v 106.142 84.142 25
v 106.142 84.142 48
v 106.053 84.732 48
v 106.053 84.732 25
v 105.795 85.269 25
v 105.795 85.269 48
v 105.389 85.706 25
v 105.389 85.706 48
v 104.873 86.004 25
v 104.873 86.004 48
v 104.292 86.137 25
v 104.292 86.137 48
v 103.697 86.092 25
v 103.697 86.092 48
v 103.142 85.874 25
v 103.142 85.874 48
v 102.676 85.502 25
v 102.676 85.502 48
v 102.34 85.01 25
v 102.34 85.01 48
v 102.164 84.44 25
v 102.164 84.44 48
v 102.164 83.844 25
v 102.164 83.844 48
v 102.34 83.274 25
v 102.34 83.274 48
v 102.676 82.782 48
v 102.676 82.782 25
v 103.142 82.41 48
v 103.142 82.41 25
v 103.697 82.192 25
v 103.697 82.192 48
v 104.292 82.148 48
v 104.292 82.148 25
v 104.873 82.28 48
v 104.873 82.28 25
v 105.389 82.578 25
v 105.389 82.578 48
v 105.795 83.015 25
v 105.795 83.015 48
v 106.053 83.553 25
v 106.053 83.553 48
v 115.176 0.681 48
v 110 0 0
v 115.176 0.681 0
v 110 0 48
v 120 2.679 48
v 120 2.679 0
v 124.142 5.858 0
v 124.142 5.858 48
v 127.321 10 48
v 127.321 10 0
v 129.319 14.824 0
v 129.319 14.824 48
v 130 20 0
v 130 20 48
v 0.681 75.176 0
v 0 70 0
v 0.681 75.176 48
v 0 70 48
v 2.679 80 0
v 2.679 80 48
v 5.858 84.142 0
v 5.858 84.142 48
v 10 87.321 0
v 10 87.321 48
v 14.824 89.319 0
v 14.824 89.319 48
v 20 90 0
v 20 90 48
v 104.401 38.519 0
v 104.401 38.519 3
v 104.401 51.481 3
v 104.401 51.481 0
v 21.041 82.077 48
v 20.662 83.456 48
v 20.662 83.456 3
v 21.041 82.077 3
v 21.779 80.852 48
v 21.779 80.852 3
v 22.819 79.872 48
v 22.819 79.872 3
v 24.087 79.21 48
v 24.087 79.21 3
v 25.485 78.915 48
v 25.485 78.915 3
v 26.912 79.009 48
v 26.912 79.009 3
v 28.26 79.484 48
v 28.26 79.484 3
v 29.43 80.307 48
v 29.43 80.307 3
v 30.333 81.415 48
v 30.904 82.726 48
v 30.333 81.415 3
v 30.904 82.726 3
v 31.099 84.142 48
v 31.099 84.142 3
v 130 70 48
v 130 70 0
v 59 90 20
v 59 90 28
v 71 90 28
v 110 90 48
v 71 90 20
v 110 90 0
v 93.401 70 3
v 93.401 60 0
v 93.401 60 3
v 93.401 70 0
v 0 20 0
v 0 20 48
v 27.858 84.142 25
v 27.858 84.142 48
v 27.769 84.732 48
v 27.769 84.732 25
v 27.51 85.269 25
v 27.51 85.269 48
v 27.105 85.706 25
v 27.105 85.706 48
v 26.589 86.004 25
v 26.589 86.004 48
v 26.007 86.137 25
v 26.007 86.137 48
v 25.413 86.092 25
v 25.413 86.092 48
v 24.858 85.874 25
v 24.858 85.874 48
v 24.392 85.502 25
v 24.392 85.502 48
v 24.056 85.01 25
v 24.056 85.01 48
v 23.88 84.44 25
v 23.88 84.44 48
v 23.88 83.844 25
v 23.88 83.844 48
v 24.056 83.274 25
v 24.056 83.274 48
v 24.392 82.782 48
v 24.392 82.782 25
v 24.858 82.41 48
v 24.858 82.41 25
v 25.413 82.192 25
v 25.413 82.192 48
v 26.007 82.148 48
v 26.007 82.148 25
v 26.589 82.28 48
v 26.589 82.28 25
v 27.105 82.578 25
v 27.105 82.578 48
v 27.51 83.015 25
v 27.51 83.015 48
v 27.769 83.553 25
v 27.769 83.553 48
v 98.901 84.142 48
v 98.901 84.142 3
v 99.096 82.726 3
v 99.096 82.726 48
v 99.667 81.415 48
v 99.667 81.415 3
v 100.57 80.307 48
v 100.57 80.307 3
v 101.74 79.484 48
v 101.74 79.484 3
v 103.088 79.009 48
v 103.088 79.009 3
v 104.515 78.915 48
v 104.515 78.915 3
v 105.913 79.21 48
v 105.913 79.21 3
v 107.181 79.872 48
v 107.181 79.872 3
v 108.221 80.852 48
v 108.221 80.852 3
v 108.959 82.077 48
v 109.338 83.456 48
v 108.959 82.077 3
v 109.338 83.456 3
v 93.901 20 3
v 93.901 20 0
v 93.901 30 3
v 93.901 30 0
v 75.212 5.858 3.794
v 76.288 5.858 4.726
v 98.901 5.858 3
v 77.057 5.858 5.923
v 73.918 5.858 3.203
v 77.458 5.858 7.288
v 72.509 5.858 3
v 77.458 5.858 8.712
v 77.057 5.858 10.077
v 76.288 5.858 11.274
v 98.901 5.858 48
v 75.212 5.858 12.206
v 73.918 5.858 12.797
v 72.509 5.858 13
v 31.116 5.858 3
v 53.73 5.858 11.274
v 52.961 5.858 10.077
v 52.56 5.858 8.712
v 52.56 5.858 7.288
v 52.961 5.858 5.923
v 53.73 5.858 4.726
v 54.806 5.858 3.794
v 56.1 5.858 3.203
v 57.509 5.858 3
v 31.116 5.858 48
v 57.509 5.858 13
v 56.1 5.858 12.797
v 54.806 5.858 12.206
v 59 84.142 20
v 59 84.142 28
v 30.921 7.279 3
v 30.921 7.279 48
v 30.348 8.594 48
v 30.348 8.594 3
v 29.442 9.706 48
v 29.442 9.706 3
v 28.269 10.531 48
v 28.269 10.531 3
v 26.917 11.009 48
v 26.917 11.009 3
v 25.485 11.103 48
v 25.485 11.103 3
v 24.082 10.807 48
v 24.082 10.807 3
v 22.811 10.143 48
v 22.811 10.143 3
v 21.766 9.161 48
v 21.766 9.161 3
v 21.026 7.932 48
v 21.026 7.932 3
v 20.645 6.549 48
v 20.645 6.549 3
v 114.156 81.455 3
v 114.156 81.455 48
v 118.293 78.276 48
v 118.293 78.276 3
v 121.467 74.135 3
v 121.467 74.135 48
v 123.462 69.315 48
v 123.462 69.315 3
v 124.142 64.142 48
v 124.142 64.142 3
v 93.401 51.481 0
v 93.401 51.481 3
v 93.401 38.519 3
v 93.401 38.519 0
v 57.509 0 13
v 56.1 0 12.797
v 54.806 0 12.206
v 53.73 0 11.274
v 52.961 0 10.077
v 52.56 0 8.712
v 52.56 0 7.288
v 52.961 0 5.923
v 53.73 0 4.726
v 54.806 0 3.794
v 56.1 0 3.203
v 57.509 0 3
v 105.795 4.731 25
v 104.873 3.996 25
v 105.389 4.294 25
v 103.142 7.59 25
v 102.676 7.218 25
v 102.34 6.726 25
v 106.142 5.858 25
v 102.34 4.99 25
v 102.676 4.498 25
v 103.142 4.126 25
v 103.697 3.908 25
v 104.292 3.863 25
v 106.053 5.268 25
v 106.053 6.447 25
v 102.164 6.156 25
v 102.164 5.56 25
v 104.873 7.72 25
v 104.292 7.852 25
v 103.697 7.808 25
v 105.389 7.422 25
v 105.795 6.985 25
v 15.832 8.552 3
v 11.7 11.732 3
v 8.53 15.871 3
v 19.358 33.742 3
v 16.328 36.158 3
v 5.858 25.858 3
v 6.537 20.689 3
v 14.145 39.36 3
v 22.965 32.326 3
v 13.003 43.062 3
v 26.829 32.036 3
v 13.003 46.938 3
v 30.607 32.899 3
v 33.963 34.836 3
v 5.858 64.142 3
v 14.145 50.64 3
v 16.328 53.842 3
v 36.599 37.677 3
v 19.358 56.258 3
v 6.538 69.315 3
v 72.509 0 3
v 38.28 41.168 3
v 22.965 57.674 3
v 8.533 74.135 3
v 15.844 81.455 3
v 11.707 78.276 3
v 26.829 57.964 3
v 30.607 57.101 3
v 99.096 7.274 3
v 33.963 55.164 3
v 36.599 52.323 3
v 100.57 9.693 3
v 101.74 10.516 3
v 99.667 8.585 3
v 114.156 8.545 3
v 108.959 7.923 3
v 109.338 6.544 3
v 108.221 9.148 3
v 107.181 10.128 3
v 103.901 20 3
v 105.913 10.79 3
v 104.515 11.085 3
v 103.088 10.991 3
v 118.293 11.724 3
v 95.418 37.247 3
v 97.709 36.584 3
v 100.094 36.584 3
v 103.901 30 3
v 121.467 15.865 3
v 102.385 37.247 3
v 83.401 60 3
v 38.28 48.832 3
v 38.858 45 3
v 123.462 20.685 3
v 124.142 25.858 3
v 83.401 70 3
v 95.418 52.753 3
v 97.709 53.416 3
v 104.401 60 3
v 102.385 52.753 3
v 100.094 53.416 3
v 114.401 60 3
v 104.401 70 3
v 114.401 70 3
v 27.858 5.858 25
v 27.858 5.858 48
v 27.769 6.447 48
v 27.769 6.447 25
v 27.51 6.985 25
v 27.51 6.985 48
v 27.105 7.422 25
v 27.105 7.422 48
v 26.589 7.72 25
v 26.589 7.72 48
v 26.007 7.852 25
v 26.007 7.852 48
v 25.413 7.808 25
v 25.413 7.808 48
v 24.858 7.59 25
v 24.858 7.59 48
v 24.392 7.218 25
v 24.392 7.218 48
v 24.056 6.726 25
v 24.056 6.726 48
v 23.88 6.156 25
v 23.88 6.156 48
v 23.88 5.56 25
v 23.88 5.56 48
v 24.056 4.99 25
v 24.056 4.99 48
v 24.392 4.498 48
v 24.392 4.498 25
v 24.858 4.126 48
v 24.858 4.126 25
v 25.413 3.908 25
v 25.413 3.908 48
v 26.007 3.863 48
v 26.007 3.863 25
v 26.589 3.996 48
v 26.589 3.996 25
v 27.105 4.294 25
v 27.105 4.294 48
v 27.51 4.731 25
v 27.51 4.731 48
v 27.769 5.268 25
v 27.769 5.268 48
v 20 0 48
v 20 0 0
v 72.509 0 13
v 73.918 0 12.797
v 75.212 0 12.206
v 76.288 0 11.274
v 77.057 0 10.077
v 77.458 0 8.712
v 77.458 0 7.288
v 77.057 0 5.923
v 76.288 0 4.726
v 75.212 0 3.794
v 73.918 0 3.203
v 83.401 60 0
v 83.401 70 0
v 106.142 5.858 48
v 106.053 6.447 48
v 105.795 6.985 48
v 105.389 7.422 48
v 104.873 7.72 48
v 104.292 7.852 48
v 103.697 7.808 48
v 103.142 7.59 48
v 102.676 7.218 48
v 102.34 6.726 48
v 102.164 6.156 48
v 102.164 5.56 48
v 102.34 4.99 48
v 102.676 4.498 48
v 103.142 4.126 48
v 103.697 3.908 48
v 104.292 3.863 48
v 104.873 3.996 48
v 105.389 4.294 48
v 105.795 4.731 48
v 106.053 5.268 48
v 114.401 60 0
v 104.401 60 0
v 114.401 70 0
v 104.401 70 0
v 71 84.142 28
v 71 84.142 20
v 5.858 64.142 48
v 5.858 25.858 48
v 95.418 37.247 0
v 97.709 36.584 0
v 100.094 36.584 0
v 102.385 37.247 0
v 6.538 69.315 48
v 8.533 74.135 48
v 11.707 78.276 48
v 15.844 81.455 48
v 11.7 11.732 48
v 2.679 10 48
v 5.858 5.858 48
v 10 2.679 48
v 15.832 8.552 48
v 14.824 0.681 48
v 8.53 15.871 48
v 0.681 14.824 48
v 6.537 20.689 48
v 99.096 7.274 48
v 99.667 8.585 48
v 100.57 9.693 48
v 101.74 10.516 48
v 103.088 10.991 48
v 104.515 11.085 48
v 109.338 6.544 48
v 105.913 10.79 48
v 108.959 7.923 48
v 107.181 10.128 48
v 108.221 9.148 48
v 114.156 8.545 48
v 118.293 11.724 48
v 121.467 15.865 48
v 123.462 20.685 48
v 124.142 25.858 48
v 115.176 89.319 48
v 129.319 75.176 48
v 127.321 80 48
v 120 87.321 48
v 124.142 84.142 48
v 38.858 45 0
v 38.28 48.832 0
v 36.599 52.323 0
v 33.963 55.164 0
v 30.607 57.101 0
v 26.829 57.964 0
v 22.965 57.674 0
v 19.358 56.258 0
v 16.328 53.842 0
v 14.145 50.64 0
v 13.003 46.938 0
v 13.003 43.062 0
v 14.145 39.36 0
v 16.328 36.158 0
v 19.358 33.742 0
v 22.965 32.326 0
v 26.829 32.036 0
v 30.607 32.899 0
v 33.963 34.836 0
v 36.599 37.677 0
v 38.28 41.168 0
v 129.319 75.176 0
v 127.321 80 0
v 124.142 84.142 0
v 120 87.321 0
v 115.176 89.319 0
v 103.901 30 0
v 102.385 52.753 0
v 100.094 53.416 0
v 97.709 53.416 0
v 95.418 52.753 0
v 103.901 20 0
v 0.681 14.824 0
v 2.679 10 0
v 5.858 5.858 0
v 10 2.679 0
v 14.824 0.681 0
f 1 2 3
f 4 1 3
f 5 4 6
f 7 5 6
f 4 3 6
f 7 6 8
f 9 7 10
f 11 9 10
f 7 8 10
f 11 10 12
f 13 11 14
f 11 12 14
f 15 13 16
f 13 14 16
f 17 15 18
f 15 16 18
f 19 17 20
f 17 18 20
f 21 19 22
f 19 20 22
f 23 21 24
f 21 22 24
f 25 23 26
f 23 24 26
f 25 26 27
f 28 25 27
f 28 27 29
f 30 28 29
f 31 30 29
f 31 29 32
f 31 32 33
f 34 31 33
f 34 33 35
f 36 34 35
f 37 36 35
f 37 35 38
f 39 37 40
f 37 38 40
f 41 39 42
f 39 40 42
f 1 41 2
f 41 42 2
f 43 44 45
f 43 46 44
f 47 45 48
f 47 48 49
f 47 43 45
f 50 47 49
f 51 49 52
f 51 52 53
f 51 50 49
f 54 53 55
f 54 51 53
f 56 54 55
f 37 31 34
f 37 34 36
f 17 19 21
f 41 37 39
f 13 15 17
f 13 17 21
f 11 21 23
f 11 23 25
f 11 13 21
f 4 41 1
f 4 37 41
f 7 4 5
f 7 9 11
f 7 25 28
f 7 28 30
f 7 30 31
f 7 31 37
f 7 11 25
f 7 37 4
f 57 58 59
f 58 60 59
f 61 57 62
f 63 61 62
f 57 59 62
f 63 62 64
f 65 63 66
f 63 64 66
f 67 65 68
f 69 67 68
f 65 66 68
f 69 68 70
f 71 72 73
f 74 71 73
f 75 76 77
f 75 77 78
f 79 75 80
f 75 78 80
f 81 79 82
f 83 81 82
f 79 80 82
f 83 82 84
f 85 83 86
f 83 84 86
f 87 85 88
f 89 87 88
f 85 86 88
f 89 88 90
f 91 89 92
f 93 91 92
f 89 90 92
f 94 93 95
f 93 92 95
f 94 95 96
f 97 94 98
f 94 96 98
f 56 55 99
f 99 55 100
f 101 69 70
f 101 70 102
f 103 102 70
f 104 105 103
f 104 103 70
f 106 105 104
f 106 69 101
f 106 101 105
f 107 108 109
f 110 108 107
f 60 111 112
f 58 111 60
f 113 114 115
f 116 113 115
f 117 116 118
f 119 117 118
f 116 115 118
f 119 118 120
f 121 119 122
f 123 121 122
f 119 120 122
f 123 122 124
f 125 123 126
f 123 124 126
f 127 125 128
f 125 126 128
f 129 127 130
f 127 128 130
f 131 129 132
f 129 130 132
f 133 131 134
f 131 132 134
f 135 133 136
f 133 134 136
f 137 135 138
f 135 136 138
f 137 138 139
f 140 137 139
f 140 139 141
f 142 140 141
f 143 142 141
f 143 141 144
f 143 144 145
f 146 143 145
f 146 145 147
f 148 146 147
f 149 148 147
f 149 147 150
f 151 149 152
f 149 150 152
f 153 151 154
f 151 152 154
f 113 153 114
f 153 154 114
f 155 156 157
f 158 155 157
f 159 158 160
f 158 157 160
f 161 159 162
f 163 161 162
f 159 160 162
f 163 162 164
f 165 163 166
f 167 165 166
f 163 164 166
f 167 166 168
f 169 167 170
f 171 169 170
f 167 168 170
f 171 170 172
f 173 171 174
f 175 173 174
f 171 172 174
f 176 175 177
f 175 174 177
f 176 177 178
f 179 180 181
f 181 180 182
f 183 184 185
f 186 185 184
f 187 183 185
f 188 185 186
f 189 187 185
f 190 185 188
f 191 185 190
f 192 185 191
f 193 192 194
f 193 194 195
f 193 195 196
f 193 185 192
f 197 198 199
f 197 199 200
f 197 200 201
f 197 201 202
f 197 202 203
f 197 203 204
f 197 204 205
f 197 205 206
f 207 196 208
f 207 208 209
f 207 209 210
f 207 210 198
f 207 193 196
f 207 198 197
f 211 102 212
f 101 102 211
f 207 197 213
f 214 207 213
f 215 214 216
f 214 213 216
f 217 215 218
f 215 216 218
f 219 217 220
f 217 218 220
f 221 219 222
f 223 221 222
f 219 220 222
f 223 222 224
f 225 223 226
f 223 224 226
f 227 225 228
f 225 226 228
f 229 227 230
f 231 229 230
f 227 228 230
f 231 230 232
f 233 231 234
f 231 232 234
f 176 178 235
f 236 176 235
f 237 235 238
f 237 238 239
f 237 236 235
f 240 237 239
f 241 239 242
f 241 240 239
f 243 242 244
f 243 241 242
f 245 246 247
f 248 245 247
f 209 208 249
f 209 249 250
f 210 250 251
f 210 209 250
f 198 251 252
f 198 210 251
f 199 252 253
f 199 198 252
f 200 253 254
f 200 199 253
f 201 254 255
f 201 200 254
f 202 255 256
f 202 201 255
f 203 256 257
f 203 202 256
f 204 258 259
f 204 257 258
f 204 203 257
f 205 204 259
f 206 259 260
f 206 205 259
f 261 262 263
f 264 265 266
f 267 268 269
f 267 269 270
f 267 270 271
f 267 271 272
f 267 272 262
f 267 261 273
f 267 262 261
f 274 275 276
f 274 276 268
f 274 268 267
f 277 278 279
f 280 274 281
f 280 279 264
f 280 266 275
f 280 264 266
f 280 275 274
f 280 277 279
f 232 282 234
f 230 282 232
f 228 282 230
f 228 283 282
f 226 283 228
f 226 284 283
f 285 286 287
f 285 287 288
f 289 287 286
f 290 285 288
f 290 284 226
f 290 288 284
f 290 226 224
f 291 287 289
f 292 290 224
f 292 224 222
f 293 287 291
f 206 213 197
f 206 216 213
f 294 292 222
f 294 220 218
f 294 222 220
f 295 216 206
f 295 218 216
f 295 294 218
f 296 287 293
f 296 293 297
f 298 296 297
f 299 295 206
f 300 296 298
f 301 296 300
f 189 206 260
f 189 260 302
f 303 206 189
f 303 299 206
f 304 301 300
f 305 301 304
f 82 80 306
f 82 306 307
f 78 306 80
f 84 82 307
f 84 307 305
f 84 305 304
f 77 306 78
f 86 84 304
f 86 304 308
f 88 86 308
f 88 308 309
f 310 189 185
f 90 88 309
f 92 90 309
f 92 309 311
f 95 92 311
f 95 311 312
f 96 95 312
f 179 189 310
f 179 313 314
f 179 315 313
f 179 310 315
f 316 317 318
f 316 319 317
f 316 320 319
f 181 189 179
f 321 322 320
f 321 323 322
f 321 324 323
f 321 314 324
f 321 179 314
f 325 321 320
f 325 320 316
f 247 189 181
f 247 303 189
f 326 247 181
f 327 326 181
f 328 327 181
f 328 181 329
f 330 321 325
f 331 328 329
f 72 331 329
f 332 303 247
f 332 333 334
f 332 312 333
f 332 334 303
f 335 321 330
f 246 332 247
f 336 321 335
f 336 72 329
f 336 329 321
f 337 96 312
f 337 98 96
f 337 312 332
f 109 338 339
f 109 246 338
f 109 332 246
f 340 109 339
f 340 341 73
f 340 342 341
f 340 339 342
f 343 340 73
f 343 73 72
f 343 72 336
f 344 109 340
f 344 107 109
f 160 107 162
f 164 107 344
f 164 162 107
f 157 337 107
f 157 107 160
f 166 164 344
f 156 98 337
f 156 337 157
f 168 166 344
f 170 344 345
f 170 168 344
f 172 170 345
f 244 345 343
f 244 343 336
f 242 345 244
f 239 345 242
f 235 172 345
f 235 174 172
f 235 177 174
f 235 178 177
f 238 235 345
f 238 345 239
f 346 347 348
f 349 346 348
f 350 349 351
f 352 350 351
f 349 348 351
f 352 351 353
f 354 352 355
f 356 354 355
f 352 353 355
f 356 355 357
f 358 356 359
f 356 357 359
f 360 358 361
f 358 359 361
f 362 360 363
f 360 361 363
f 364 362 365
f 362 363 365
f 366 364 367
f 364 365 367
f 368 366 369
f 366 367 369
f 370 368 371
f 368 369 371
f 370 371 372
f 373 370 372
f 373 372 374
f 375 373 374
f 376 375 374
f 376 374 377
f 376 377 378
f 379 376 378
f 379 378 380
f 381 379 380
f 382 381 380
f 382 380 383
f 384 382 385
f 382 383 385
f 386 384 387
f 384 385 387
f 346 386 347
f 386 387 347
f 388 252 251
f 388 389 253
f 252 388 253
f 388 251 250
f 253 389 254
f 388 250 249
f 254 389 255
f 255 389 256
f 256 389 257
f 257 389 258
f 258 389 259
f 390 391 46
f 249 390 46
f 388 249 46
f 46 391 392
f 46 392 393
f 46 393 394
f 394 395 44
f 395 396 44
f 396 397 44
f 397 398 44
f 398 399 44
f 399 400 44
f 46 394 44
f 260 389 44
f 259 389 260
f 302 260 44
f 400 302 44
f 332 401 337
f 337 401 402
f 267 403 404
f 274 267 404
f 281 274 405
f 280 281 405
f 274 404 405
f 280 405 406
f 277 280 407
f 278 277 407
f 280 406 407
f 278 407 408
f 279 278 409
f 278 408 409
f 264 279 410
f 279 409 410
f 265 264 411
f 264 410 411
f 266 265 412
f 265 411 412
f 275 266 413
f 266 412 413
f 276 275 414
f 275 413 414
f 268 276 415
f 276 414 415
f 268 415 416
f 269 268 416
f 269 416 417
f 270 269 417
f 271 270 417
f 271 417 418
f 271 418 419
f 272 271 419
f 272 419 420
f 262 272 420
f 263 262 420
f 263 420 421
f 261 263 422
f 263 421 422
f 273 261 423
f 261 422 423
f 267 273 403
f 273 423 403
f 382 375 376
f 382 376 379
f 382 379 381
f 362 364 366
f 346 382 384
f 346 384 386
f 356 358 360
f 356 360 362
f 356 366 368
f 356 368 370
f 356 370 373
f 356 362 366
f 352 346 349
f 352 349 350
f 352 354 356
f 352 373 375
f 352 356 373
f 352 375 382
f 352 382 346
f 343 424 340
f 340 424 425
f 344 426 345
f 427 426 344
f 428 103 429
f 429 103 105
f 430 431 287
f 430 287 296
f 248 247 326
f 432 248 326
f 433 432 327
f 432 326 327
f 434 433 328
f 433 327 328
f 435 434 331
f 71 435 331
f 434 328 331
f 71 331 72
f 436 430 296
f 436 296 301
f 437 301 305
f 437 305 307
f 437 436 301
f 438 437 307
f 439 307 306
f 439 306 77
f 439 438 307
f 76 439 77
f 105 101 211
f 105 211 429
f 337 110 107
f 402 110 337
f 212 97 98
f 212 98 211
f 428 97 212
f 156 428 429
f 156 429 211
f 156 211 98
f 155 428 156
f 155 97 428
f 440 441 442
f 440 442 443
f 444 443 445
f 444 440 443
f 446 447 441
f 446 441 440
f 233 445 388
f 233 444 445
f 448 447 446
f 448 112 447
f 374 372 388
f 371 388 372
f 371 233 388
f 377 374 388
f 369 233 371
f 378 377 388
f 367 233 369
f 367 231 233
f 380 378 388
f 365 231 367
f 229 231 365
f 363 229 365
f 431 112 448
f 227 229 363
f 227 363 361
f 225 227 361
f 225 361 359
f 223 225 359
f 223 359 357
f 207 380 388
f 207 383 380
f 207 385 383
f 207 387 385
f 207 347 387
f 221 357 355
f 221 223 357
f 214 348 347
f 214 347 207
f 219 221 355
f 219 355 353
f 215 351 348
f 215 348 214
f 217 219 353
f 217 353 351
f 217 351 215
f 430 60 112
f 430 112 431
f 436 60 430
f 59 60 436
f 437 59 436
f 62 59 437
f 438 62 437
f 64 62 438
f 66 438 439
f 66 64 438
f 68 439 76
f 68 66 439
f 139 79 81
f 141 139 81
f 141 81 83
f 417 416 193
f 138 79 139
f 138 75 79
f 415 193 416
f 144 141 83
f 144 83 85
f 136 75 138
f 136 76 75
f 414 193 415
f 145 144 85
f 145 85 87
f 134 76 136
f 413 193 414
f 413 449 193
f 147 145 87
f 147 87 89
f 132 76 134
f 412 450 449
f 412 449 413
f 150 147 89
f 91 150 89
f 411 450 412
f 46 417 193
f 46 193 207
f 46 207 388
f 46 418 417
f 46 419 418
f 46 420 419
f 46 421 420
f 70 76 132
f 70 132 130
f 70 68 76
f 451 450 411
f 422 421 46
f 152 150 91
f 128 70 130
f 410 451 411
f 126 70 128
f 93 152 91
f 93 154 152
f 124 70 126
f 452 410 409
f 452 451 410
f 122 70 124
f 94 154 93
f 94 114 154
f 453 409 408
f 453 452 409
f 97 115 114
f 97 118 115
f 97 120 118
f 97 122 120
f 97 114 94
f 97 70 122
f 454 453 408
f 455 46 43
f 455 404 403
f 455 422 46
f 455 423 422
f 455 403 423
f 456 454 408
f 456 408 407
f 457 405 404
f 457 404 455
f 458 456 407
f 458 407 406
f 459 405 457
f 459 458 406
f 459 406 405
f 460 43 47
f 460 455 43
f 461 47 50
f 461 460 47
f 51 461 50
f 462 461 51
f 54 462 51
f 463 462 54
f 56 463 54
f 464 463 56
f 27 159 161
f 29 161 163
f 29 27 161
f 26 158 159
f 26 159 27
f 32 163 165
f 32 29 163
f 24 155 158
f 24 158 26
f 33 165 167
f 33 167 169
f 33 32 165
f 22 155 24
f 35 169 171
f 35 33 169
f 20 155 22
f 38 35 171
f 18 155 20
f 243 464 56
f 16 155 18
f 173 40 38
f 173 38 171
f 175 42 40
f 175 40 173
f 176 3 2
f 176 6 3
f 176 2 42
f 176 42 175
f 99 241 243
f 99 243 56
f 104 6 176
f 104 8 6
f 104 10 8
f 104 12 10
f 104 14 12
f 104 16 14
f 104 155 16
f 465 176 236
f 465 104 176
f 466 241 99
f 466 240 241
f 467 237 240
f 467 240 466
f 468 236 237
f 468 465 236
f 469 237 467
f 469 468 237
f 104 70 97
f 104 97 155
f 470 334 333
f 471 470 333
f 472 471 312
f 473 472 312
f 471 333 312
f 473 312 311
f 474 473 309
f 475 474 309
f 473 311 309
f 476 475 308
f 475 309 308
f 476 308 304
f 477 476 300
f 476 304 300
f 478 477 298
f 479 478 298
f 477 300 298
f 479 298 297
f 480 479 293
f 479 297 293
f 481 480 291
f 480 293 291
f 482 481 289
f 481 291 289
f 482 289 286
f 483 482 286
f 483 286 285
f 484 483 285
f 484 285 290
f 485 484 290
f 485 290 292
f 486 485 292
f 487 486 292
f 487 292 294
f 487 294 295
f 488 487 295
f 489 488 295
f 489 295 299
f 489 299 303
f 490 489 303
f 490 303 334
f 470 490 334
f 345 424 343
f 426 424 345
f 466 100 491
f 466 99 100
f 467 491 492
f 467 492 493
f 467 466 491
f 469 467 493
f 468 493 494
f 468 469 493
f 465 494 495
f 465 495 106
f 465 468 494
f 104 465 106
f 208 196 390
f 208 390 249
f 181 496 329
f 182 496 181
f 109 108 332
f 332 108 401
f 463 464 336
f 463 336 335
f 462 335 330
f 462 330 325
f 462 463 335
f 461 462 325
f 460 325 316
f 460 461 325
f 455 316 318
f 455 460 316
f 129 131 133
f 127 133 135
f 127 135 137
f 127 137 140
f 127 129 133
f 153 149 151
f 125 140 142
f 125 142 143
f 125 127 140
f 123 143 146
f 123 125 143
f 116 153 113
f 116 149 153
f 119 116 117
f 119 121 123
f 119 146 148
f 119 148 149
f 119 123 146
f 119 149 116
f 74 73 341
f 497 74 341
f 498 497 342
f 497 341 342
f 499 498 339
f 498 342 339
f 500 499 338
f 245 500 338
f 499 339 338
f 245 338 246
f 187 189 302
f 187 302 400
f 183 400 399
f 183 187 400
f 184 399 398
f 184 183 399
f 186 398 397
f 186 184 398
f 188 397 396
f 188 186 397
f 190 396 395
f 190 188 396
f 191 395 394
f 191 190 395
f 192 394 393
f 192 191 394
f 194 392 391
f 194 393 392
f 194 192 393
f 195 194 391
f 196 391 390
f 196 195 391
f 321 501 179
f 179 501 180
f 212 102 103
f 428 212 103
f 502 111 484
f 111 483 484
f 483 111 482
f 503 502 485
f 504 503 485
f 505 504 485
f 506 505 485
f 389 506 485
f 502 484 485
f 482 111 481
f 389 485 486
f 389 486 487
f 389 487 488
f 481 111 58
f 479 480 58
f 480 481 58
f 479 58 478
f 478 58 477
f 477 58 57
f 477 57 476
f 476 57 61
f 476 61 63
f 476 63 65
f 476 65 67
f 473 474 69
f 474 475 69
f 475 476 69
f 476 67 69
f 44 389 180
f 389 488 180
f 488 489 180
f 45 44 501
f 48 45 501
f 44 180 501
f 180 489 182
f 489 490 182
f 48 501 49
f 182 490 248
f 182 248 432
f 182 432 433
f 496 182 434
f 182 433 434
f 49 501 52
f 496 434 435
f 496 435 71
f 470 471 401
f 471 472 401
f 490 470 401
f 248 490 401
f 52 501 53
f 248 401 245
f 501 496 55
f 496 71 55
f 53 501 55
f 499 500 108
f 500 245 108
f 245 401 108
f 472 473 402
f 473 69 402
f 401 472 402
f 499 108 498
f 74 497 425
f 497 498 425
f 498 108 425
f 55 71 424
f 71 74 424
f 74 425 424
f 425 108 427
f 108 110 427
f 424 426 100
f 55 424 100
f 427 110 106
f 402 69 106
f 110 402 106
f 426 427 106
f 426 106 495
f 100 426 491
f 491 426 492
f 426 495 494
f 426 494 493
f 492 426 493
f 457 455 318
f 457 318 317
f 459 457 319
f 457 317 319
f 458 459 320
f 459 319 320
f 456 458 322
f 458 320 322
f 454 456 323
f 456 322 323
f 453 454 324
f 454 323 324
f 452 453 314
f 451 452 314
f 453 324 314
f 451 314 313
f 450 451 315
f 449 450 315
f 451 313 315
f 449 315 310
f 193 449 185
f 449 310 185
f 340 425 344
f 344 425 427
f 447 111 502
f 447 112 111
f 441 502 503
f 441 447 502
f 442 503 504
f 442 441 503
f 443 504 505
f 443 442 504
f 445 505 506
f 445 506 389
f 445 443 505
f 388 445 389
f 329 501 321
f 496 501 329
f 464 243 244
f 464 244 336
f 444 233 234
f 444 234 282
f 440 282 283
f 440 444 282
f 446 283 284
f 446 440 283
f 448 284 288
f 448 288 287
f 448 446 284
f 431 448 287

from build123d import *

# Parameters (mm, degrees)
SKETCH1_W           = 130
SKETCH1_H           = 90
BOSS_EXTRUDE1_DEPTH = 48
FILLET1_R           = 20
CUT_EXTRUDE4_DEPTH  = 45
SKETCH3_R           = 5.240734637
SKETCH3_R_2         = 5.258413594
BOSS_EXTRUDE2_DEPTH = 45
CUT_EXTRUDE5_REACH  = 92
SKETCH4_W           = 12
SKETCH4_H           = 8
SKETCH5_R           = 2
CUT_EXTRUDE6_DEPTH  = 23
CUT_EXTRUDE7_DEPTH  = 10
SKETCH7_R           = 13
CUT_EXTRUDE8_DEPTH  = 10
SKETCH8_W           = 10
SKETCH8_H           = 10
CUT_EXTRUDE9_DEPTH  = 30
SKETCH9_W           = 10
SKETCH9_H           = 10
CUT_EXTRUDE10_DEPTH = 10
CUT_EXTRUDE11_DEPTH = 10


with BuildPart() as part:
    # Sketch1 → Boss-Extrude1 (new body)
    with BuildSketch(Plane.XY):
        with Locations((65, 45)):
            Rectangle(SKETCH1_W, SKETCH1_H)
    extrude(amount=BOSS_EXTRUDE1_DEPTH)

    # Fillet1
    fillet1_edges = [part.edges().sort_by_distance(p)[0] for p in [
        (0, 90, 24),
        (130, 90, 24),
        (130, 0, 24),
        (0, 0, 24),
    ]]
    fillet(fillet1_edges, radius=FILLET1_R)

    # Sketch2 → Cut-Extrude4 (cut)
    with BuildSketch(Plane.XY.offset(48)):
        with BuildLine():
            Line((104.142135624, 5.857864376), (25.857864376, 5.857864376))
            ThreePointArc((25.857864376, 5.857864376), (11.715728753, 11.715728753), (5.857864376, 25.857864376))
            Line((5.857864376, 25.857864376), (5.857864376, 64.142135624))
            ThreePointArc((5.857864376, 64.142135624), (11.715728753, 78.284271247), (25.857864376, 84.142135624))
            Line((25.857864376, 84.142135624), (104.142135624, 84.142135624))
            ThreePointArc((104.142135624, 84.142135624), (118.284271247, 78.284271247), (124.142135624, 64.142135624))
            Line((124.142135624, 64.142135624), (124.142135624, 25.857864376))
            ThreePointArc((124.142135624, 25.857864376), (118.284271247, 11.715728753), (104.142135624, 5.857864376))
        make_face()
    extrude(amount=-CUT_EXTRUDE4_DEPTH, mode=Mode.SUBTRACT)

    # Sketch3 → Boss-Extrude2 (add)
    with BuildSketch(Plane.XY.offset(3)):
        with Locations((25.857864376, 84.142135624)):
            Circle(SKETCH3_R)
        with Locations((104.142135624, 84.142135624)):
            Circle(SKETCH3_R)
        with Locations((25.857864376, 5.857864376)):
            Circle(SKETCH3_R_2)
        with Locations((104.142135624, 5.857864376)):
            Circle(SKETCH3_R)
    extrude(amount=BOSS_EXTRUDE2_DEPTH)

    # Sketch4 → Cut-Extrude5 (cut, up to next)
    with BuildSketch(Plane(origin=(0, 90, 0), x_dir=(1, 0, 0), z_dir=(0, 1, 0)), mode=Mode.PRIVATE) as cut_extrude5_sk1:
        with Locations((65, -24)):
            Rectangle(SKETCH4_W, SKETCH4_H)
    cut_extrude5_tool1 = extrude(cut_extrude5_sk1.sketch, amount=-CUT_EXTRUDE5_REACH, mode=Mode.PRIVATE) & part.part
    add(cut_extrude5_tool1.solids().sort_by_distance((65, 90, 24))[0], mode=Mode.SUBTRACT)

    # Sketch5 → Cut-Extrude6 (cut)
    with BuildSketch(Plane.XY.offset(48)):
        with Locations((25.857864376, 84.142135624)):
            Circle(SKETCH5_R)
        with Locations((104.142135624, 84.142135624)):
            Circle(SKETCH5_R)
        with Locations((104.142135624, 5.857864376)):
            Circle(SKETCH5_R)
        with Locations((25.857864376, 5.857864376)):
            Circle(SKETCH5_R)
    extrude(amount=-CUT_EXTRUDE6_DEPTH, mode=Mode.SUBTRACT)

    # Sketch6 → Cut-Extrude7 (cut)
    with BuildSketch(Plane.XY.offset(3)):
        with BuildLine():
            Line((93.401400986, 51.480740698), (93.401400986, 38.519259302))
            ThreePointArc((93.401400986, 38.519259302), (98.901400986, 36.5), (104.401400986, 38.519259302))
            Line((104.401400986, 38.519259302), (104.401400986, 51.480740698))
            ThreePointArc((104.401400986, 51.480740698), (98.901400986, 53.5), (93.401400986, 51.480740698))
        make_face()
    extrude(amount=-CUT_EXTRUDE7_DEPTH, mode=Mode.SUBTRACT)

    # Sketch7 → Cut-Extrude8 (cut)
    with BuildSketch(Plane.XY.offset(3)):
        with Locations((25.857864376, 45)):
            Circle(SKETCH7_R)
    extrude(amount=-CUT_EXTRUDE8_DEPTH, mode=Mode.SUBTRACT)

    # Sketch8 → Cut-Extrude9 (cut)
    with BuildSketch(Plane(origin=(0, 0, 0), x_dir=(-1, 0, 0), z_dir=(0, 0, -1))):
        with Locations((-109.401400986, 65)):
            Rectangle(SKETCH8_W, SKETCH8_H)
        with Locations((-88.401400986, 65)):
            Rectangle(SKETCH8_W, SKETCH8_H)
    extrude(amount=-CUT_EXTRUDE9_DEPTH, mode=Mode.SUBTRACT)

    # Sketch9 → Cut-Extrude10 (cut)
    with BuildSketch(Plane(origin=(0, 0, 0), x_dir=(-1, 0, 0), z_dir=(0, 0, -1))):
        with Locations((-98.901400986, 25)):
            Rectangle(SKETCH9_W, SKETCH9_H)
    extrude(amount=-CUT_EXTRUDE10_DEPTH, mode=Mode.SUBTRACT)

    # Sketch11 → Cut-Extrude11 (cut)
    with BuildSketch(Plane(origin=(0, 5.857864376, 0), x_dir=(1, 0, 0), z_dir=(0, 1, 0))):
        with BuildLine():
            Line((57.508839478, -3), (72.508839478, -3))
            ThreePointArc((72.508839478, -3), (77.508839478, -8), (72.508839478, -13))
            Line((72.508839478, -13), (57.508839478, -13))
            ThreePointArc((57.508839478, -13), (52.508839478, -8), (57.508839478, -3))
        make_face()
    extrude(amount=-CUT_EXTRUDE11_DEPTH, mode=Mode.SUBTRACT)


solid = part.part
